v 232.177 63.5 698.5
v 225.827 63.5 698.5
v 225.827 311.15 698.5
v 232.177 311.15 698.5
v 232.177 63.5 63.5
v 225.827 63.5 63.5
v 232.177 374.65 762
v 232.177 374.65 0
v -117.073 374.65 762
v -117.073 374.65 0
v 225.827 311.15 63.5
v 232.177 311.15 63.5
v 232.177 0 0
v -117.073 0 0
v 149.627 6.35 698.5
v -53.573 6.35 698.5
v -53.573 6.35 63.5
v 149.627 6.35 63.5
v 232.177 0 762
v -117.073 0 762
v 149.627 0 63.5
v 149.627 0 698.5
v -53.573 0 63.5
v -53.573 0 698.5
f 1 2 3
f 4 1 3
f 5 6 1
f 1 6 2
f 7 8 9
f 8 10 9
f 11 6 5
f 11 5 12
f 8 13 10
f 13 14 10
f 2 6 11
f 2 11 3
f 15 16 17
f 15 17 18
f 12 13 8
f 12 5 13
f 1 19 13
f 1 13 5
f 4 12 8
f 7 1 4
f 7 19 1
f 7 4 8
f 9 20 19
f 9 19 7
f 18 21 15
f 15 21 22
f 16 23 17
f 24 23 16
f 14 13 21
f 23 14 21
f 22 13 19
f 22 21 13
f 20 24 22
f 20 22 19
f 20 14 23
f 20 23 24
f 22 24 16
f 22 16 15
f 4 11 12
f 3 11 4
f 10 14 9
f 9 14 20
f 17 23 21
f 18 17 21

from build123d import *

# Parameters (mm, degrees)
F0_W     = 330.2
F0_H     = 762
F0_W_2   = 203.2
F0_H_2   = 635
F1_DEPTH = 374.65
F2_DEPTH = 6.35
F3_W     = 374.65
F3_H     = 762
F3_W_2   = 247.65
F3_H_2   = 635
F4_DEPTH = 19.05
F5_DEPTH = 12.7


# Not quite as in the source:
# - a feature names something its author has since deleted; it is built from what else it names


with BuildPart() as f1:
    # F0 (on Front) → F1 (new body)
    with BuildSketch(Plane.XZ):
        with Locations((48.0267770052, 381)):
            Rectangle(F0_W, F0_H)
        with Locations((48.0267770052, 381)):
            Rectangle(F0_W_2, F0_H_2, mode=Mode.SUBTRACT)
        with Locations((48.0267770052, 381)):
            Rectangle(F0_W_2, F0_H_2)
    extrude(amount=-F1_DEPTH)

    # F0 (on Front) → F2 (cut)
    with BuildSketch(Plane.XZ):
        with Locations((48.0267770052, 381)):
            Rectangle(F0_W_2, F0_H_2)
    extrude(amount=-F2_DEPTH, mode=Mode.SUBTRACT)

    # F3 (on face) → F4 (join)
    with BuildSketch(Plane.YZ.offset(213.1267770052)):
        with Locations((187.325, 381)):
            Rectangle(F3_W, F3_H)
        with Locations((187.325, 381)):
            Rectangle(F3_W_2, F3_H_2, mode=Mode.SUBTRACT)
    extrude(amount=F4_DEPTH)

    # F5 (add): a face of the model
    f5_faces = [f1.faces().sort_by_distance(p)[0] for p in [
        (213.1267770052, 187.325, 381),
    ]]
    extrude(f5_faces, amount=F5_DEPTH)


solid = f1.part
